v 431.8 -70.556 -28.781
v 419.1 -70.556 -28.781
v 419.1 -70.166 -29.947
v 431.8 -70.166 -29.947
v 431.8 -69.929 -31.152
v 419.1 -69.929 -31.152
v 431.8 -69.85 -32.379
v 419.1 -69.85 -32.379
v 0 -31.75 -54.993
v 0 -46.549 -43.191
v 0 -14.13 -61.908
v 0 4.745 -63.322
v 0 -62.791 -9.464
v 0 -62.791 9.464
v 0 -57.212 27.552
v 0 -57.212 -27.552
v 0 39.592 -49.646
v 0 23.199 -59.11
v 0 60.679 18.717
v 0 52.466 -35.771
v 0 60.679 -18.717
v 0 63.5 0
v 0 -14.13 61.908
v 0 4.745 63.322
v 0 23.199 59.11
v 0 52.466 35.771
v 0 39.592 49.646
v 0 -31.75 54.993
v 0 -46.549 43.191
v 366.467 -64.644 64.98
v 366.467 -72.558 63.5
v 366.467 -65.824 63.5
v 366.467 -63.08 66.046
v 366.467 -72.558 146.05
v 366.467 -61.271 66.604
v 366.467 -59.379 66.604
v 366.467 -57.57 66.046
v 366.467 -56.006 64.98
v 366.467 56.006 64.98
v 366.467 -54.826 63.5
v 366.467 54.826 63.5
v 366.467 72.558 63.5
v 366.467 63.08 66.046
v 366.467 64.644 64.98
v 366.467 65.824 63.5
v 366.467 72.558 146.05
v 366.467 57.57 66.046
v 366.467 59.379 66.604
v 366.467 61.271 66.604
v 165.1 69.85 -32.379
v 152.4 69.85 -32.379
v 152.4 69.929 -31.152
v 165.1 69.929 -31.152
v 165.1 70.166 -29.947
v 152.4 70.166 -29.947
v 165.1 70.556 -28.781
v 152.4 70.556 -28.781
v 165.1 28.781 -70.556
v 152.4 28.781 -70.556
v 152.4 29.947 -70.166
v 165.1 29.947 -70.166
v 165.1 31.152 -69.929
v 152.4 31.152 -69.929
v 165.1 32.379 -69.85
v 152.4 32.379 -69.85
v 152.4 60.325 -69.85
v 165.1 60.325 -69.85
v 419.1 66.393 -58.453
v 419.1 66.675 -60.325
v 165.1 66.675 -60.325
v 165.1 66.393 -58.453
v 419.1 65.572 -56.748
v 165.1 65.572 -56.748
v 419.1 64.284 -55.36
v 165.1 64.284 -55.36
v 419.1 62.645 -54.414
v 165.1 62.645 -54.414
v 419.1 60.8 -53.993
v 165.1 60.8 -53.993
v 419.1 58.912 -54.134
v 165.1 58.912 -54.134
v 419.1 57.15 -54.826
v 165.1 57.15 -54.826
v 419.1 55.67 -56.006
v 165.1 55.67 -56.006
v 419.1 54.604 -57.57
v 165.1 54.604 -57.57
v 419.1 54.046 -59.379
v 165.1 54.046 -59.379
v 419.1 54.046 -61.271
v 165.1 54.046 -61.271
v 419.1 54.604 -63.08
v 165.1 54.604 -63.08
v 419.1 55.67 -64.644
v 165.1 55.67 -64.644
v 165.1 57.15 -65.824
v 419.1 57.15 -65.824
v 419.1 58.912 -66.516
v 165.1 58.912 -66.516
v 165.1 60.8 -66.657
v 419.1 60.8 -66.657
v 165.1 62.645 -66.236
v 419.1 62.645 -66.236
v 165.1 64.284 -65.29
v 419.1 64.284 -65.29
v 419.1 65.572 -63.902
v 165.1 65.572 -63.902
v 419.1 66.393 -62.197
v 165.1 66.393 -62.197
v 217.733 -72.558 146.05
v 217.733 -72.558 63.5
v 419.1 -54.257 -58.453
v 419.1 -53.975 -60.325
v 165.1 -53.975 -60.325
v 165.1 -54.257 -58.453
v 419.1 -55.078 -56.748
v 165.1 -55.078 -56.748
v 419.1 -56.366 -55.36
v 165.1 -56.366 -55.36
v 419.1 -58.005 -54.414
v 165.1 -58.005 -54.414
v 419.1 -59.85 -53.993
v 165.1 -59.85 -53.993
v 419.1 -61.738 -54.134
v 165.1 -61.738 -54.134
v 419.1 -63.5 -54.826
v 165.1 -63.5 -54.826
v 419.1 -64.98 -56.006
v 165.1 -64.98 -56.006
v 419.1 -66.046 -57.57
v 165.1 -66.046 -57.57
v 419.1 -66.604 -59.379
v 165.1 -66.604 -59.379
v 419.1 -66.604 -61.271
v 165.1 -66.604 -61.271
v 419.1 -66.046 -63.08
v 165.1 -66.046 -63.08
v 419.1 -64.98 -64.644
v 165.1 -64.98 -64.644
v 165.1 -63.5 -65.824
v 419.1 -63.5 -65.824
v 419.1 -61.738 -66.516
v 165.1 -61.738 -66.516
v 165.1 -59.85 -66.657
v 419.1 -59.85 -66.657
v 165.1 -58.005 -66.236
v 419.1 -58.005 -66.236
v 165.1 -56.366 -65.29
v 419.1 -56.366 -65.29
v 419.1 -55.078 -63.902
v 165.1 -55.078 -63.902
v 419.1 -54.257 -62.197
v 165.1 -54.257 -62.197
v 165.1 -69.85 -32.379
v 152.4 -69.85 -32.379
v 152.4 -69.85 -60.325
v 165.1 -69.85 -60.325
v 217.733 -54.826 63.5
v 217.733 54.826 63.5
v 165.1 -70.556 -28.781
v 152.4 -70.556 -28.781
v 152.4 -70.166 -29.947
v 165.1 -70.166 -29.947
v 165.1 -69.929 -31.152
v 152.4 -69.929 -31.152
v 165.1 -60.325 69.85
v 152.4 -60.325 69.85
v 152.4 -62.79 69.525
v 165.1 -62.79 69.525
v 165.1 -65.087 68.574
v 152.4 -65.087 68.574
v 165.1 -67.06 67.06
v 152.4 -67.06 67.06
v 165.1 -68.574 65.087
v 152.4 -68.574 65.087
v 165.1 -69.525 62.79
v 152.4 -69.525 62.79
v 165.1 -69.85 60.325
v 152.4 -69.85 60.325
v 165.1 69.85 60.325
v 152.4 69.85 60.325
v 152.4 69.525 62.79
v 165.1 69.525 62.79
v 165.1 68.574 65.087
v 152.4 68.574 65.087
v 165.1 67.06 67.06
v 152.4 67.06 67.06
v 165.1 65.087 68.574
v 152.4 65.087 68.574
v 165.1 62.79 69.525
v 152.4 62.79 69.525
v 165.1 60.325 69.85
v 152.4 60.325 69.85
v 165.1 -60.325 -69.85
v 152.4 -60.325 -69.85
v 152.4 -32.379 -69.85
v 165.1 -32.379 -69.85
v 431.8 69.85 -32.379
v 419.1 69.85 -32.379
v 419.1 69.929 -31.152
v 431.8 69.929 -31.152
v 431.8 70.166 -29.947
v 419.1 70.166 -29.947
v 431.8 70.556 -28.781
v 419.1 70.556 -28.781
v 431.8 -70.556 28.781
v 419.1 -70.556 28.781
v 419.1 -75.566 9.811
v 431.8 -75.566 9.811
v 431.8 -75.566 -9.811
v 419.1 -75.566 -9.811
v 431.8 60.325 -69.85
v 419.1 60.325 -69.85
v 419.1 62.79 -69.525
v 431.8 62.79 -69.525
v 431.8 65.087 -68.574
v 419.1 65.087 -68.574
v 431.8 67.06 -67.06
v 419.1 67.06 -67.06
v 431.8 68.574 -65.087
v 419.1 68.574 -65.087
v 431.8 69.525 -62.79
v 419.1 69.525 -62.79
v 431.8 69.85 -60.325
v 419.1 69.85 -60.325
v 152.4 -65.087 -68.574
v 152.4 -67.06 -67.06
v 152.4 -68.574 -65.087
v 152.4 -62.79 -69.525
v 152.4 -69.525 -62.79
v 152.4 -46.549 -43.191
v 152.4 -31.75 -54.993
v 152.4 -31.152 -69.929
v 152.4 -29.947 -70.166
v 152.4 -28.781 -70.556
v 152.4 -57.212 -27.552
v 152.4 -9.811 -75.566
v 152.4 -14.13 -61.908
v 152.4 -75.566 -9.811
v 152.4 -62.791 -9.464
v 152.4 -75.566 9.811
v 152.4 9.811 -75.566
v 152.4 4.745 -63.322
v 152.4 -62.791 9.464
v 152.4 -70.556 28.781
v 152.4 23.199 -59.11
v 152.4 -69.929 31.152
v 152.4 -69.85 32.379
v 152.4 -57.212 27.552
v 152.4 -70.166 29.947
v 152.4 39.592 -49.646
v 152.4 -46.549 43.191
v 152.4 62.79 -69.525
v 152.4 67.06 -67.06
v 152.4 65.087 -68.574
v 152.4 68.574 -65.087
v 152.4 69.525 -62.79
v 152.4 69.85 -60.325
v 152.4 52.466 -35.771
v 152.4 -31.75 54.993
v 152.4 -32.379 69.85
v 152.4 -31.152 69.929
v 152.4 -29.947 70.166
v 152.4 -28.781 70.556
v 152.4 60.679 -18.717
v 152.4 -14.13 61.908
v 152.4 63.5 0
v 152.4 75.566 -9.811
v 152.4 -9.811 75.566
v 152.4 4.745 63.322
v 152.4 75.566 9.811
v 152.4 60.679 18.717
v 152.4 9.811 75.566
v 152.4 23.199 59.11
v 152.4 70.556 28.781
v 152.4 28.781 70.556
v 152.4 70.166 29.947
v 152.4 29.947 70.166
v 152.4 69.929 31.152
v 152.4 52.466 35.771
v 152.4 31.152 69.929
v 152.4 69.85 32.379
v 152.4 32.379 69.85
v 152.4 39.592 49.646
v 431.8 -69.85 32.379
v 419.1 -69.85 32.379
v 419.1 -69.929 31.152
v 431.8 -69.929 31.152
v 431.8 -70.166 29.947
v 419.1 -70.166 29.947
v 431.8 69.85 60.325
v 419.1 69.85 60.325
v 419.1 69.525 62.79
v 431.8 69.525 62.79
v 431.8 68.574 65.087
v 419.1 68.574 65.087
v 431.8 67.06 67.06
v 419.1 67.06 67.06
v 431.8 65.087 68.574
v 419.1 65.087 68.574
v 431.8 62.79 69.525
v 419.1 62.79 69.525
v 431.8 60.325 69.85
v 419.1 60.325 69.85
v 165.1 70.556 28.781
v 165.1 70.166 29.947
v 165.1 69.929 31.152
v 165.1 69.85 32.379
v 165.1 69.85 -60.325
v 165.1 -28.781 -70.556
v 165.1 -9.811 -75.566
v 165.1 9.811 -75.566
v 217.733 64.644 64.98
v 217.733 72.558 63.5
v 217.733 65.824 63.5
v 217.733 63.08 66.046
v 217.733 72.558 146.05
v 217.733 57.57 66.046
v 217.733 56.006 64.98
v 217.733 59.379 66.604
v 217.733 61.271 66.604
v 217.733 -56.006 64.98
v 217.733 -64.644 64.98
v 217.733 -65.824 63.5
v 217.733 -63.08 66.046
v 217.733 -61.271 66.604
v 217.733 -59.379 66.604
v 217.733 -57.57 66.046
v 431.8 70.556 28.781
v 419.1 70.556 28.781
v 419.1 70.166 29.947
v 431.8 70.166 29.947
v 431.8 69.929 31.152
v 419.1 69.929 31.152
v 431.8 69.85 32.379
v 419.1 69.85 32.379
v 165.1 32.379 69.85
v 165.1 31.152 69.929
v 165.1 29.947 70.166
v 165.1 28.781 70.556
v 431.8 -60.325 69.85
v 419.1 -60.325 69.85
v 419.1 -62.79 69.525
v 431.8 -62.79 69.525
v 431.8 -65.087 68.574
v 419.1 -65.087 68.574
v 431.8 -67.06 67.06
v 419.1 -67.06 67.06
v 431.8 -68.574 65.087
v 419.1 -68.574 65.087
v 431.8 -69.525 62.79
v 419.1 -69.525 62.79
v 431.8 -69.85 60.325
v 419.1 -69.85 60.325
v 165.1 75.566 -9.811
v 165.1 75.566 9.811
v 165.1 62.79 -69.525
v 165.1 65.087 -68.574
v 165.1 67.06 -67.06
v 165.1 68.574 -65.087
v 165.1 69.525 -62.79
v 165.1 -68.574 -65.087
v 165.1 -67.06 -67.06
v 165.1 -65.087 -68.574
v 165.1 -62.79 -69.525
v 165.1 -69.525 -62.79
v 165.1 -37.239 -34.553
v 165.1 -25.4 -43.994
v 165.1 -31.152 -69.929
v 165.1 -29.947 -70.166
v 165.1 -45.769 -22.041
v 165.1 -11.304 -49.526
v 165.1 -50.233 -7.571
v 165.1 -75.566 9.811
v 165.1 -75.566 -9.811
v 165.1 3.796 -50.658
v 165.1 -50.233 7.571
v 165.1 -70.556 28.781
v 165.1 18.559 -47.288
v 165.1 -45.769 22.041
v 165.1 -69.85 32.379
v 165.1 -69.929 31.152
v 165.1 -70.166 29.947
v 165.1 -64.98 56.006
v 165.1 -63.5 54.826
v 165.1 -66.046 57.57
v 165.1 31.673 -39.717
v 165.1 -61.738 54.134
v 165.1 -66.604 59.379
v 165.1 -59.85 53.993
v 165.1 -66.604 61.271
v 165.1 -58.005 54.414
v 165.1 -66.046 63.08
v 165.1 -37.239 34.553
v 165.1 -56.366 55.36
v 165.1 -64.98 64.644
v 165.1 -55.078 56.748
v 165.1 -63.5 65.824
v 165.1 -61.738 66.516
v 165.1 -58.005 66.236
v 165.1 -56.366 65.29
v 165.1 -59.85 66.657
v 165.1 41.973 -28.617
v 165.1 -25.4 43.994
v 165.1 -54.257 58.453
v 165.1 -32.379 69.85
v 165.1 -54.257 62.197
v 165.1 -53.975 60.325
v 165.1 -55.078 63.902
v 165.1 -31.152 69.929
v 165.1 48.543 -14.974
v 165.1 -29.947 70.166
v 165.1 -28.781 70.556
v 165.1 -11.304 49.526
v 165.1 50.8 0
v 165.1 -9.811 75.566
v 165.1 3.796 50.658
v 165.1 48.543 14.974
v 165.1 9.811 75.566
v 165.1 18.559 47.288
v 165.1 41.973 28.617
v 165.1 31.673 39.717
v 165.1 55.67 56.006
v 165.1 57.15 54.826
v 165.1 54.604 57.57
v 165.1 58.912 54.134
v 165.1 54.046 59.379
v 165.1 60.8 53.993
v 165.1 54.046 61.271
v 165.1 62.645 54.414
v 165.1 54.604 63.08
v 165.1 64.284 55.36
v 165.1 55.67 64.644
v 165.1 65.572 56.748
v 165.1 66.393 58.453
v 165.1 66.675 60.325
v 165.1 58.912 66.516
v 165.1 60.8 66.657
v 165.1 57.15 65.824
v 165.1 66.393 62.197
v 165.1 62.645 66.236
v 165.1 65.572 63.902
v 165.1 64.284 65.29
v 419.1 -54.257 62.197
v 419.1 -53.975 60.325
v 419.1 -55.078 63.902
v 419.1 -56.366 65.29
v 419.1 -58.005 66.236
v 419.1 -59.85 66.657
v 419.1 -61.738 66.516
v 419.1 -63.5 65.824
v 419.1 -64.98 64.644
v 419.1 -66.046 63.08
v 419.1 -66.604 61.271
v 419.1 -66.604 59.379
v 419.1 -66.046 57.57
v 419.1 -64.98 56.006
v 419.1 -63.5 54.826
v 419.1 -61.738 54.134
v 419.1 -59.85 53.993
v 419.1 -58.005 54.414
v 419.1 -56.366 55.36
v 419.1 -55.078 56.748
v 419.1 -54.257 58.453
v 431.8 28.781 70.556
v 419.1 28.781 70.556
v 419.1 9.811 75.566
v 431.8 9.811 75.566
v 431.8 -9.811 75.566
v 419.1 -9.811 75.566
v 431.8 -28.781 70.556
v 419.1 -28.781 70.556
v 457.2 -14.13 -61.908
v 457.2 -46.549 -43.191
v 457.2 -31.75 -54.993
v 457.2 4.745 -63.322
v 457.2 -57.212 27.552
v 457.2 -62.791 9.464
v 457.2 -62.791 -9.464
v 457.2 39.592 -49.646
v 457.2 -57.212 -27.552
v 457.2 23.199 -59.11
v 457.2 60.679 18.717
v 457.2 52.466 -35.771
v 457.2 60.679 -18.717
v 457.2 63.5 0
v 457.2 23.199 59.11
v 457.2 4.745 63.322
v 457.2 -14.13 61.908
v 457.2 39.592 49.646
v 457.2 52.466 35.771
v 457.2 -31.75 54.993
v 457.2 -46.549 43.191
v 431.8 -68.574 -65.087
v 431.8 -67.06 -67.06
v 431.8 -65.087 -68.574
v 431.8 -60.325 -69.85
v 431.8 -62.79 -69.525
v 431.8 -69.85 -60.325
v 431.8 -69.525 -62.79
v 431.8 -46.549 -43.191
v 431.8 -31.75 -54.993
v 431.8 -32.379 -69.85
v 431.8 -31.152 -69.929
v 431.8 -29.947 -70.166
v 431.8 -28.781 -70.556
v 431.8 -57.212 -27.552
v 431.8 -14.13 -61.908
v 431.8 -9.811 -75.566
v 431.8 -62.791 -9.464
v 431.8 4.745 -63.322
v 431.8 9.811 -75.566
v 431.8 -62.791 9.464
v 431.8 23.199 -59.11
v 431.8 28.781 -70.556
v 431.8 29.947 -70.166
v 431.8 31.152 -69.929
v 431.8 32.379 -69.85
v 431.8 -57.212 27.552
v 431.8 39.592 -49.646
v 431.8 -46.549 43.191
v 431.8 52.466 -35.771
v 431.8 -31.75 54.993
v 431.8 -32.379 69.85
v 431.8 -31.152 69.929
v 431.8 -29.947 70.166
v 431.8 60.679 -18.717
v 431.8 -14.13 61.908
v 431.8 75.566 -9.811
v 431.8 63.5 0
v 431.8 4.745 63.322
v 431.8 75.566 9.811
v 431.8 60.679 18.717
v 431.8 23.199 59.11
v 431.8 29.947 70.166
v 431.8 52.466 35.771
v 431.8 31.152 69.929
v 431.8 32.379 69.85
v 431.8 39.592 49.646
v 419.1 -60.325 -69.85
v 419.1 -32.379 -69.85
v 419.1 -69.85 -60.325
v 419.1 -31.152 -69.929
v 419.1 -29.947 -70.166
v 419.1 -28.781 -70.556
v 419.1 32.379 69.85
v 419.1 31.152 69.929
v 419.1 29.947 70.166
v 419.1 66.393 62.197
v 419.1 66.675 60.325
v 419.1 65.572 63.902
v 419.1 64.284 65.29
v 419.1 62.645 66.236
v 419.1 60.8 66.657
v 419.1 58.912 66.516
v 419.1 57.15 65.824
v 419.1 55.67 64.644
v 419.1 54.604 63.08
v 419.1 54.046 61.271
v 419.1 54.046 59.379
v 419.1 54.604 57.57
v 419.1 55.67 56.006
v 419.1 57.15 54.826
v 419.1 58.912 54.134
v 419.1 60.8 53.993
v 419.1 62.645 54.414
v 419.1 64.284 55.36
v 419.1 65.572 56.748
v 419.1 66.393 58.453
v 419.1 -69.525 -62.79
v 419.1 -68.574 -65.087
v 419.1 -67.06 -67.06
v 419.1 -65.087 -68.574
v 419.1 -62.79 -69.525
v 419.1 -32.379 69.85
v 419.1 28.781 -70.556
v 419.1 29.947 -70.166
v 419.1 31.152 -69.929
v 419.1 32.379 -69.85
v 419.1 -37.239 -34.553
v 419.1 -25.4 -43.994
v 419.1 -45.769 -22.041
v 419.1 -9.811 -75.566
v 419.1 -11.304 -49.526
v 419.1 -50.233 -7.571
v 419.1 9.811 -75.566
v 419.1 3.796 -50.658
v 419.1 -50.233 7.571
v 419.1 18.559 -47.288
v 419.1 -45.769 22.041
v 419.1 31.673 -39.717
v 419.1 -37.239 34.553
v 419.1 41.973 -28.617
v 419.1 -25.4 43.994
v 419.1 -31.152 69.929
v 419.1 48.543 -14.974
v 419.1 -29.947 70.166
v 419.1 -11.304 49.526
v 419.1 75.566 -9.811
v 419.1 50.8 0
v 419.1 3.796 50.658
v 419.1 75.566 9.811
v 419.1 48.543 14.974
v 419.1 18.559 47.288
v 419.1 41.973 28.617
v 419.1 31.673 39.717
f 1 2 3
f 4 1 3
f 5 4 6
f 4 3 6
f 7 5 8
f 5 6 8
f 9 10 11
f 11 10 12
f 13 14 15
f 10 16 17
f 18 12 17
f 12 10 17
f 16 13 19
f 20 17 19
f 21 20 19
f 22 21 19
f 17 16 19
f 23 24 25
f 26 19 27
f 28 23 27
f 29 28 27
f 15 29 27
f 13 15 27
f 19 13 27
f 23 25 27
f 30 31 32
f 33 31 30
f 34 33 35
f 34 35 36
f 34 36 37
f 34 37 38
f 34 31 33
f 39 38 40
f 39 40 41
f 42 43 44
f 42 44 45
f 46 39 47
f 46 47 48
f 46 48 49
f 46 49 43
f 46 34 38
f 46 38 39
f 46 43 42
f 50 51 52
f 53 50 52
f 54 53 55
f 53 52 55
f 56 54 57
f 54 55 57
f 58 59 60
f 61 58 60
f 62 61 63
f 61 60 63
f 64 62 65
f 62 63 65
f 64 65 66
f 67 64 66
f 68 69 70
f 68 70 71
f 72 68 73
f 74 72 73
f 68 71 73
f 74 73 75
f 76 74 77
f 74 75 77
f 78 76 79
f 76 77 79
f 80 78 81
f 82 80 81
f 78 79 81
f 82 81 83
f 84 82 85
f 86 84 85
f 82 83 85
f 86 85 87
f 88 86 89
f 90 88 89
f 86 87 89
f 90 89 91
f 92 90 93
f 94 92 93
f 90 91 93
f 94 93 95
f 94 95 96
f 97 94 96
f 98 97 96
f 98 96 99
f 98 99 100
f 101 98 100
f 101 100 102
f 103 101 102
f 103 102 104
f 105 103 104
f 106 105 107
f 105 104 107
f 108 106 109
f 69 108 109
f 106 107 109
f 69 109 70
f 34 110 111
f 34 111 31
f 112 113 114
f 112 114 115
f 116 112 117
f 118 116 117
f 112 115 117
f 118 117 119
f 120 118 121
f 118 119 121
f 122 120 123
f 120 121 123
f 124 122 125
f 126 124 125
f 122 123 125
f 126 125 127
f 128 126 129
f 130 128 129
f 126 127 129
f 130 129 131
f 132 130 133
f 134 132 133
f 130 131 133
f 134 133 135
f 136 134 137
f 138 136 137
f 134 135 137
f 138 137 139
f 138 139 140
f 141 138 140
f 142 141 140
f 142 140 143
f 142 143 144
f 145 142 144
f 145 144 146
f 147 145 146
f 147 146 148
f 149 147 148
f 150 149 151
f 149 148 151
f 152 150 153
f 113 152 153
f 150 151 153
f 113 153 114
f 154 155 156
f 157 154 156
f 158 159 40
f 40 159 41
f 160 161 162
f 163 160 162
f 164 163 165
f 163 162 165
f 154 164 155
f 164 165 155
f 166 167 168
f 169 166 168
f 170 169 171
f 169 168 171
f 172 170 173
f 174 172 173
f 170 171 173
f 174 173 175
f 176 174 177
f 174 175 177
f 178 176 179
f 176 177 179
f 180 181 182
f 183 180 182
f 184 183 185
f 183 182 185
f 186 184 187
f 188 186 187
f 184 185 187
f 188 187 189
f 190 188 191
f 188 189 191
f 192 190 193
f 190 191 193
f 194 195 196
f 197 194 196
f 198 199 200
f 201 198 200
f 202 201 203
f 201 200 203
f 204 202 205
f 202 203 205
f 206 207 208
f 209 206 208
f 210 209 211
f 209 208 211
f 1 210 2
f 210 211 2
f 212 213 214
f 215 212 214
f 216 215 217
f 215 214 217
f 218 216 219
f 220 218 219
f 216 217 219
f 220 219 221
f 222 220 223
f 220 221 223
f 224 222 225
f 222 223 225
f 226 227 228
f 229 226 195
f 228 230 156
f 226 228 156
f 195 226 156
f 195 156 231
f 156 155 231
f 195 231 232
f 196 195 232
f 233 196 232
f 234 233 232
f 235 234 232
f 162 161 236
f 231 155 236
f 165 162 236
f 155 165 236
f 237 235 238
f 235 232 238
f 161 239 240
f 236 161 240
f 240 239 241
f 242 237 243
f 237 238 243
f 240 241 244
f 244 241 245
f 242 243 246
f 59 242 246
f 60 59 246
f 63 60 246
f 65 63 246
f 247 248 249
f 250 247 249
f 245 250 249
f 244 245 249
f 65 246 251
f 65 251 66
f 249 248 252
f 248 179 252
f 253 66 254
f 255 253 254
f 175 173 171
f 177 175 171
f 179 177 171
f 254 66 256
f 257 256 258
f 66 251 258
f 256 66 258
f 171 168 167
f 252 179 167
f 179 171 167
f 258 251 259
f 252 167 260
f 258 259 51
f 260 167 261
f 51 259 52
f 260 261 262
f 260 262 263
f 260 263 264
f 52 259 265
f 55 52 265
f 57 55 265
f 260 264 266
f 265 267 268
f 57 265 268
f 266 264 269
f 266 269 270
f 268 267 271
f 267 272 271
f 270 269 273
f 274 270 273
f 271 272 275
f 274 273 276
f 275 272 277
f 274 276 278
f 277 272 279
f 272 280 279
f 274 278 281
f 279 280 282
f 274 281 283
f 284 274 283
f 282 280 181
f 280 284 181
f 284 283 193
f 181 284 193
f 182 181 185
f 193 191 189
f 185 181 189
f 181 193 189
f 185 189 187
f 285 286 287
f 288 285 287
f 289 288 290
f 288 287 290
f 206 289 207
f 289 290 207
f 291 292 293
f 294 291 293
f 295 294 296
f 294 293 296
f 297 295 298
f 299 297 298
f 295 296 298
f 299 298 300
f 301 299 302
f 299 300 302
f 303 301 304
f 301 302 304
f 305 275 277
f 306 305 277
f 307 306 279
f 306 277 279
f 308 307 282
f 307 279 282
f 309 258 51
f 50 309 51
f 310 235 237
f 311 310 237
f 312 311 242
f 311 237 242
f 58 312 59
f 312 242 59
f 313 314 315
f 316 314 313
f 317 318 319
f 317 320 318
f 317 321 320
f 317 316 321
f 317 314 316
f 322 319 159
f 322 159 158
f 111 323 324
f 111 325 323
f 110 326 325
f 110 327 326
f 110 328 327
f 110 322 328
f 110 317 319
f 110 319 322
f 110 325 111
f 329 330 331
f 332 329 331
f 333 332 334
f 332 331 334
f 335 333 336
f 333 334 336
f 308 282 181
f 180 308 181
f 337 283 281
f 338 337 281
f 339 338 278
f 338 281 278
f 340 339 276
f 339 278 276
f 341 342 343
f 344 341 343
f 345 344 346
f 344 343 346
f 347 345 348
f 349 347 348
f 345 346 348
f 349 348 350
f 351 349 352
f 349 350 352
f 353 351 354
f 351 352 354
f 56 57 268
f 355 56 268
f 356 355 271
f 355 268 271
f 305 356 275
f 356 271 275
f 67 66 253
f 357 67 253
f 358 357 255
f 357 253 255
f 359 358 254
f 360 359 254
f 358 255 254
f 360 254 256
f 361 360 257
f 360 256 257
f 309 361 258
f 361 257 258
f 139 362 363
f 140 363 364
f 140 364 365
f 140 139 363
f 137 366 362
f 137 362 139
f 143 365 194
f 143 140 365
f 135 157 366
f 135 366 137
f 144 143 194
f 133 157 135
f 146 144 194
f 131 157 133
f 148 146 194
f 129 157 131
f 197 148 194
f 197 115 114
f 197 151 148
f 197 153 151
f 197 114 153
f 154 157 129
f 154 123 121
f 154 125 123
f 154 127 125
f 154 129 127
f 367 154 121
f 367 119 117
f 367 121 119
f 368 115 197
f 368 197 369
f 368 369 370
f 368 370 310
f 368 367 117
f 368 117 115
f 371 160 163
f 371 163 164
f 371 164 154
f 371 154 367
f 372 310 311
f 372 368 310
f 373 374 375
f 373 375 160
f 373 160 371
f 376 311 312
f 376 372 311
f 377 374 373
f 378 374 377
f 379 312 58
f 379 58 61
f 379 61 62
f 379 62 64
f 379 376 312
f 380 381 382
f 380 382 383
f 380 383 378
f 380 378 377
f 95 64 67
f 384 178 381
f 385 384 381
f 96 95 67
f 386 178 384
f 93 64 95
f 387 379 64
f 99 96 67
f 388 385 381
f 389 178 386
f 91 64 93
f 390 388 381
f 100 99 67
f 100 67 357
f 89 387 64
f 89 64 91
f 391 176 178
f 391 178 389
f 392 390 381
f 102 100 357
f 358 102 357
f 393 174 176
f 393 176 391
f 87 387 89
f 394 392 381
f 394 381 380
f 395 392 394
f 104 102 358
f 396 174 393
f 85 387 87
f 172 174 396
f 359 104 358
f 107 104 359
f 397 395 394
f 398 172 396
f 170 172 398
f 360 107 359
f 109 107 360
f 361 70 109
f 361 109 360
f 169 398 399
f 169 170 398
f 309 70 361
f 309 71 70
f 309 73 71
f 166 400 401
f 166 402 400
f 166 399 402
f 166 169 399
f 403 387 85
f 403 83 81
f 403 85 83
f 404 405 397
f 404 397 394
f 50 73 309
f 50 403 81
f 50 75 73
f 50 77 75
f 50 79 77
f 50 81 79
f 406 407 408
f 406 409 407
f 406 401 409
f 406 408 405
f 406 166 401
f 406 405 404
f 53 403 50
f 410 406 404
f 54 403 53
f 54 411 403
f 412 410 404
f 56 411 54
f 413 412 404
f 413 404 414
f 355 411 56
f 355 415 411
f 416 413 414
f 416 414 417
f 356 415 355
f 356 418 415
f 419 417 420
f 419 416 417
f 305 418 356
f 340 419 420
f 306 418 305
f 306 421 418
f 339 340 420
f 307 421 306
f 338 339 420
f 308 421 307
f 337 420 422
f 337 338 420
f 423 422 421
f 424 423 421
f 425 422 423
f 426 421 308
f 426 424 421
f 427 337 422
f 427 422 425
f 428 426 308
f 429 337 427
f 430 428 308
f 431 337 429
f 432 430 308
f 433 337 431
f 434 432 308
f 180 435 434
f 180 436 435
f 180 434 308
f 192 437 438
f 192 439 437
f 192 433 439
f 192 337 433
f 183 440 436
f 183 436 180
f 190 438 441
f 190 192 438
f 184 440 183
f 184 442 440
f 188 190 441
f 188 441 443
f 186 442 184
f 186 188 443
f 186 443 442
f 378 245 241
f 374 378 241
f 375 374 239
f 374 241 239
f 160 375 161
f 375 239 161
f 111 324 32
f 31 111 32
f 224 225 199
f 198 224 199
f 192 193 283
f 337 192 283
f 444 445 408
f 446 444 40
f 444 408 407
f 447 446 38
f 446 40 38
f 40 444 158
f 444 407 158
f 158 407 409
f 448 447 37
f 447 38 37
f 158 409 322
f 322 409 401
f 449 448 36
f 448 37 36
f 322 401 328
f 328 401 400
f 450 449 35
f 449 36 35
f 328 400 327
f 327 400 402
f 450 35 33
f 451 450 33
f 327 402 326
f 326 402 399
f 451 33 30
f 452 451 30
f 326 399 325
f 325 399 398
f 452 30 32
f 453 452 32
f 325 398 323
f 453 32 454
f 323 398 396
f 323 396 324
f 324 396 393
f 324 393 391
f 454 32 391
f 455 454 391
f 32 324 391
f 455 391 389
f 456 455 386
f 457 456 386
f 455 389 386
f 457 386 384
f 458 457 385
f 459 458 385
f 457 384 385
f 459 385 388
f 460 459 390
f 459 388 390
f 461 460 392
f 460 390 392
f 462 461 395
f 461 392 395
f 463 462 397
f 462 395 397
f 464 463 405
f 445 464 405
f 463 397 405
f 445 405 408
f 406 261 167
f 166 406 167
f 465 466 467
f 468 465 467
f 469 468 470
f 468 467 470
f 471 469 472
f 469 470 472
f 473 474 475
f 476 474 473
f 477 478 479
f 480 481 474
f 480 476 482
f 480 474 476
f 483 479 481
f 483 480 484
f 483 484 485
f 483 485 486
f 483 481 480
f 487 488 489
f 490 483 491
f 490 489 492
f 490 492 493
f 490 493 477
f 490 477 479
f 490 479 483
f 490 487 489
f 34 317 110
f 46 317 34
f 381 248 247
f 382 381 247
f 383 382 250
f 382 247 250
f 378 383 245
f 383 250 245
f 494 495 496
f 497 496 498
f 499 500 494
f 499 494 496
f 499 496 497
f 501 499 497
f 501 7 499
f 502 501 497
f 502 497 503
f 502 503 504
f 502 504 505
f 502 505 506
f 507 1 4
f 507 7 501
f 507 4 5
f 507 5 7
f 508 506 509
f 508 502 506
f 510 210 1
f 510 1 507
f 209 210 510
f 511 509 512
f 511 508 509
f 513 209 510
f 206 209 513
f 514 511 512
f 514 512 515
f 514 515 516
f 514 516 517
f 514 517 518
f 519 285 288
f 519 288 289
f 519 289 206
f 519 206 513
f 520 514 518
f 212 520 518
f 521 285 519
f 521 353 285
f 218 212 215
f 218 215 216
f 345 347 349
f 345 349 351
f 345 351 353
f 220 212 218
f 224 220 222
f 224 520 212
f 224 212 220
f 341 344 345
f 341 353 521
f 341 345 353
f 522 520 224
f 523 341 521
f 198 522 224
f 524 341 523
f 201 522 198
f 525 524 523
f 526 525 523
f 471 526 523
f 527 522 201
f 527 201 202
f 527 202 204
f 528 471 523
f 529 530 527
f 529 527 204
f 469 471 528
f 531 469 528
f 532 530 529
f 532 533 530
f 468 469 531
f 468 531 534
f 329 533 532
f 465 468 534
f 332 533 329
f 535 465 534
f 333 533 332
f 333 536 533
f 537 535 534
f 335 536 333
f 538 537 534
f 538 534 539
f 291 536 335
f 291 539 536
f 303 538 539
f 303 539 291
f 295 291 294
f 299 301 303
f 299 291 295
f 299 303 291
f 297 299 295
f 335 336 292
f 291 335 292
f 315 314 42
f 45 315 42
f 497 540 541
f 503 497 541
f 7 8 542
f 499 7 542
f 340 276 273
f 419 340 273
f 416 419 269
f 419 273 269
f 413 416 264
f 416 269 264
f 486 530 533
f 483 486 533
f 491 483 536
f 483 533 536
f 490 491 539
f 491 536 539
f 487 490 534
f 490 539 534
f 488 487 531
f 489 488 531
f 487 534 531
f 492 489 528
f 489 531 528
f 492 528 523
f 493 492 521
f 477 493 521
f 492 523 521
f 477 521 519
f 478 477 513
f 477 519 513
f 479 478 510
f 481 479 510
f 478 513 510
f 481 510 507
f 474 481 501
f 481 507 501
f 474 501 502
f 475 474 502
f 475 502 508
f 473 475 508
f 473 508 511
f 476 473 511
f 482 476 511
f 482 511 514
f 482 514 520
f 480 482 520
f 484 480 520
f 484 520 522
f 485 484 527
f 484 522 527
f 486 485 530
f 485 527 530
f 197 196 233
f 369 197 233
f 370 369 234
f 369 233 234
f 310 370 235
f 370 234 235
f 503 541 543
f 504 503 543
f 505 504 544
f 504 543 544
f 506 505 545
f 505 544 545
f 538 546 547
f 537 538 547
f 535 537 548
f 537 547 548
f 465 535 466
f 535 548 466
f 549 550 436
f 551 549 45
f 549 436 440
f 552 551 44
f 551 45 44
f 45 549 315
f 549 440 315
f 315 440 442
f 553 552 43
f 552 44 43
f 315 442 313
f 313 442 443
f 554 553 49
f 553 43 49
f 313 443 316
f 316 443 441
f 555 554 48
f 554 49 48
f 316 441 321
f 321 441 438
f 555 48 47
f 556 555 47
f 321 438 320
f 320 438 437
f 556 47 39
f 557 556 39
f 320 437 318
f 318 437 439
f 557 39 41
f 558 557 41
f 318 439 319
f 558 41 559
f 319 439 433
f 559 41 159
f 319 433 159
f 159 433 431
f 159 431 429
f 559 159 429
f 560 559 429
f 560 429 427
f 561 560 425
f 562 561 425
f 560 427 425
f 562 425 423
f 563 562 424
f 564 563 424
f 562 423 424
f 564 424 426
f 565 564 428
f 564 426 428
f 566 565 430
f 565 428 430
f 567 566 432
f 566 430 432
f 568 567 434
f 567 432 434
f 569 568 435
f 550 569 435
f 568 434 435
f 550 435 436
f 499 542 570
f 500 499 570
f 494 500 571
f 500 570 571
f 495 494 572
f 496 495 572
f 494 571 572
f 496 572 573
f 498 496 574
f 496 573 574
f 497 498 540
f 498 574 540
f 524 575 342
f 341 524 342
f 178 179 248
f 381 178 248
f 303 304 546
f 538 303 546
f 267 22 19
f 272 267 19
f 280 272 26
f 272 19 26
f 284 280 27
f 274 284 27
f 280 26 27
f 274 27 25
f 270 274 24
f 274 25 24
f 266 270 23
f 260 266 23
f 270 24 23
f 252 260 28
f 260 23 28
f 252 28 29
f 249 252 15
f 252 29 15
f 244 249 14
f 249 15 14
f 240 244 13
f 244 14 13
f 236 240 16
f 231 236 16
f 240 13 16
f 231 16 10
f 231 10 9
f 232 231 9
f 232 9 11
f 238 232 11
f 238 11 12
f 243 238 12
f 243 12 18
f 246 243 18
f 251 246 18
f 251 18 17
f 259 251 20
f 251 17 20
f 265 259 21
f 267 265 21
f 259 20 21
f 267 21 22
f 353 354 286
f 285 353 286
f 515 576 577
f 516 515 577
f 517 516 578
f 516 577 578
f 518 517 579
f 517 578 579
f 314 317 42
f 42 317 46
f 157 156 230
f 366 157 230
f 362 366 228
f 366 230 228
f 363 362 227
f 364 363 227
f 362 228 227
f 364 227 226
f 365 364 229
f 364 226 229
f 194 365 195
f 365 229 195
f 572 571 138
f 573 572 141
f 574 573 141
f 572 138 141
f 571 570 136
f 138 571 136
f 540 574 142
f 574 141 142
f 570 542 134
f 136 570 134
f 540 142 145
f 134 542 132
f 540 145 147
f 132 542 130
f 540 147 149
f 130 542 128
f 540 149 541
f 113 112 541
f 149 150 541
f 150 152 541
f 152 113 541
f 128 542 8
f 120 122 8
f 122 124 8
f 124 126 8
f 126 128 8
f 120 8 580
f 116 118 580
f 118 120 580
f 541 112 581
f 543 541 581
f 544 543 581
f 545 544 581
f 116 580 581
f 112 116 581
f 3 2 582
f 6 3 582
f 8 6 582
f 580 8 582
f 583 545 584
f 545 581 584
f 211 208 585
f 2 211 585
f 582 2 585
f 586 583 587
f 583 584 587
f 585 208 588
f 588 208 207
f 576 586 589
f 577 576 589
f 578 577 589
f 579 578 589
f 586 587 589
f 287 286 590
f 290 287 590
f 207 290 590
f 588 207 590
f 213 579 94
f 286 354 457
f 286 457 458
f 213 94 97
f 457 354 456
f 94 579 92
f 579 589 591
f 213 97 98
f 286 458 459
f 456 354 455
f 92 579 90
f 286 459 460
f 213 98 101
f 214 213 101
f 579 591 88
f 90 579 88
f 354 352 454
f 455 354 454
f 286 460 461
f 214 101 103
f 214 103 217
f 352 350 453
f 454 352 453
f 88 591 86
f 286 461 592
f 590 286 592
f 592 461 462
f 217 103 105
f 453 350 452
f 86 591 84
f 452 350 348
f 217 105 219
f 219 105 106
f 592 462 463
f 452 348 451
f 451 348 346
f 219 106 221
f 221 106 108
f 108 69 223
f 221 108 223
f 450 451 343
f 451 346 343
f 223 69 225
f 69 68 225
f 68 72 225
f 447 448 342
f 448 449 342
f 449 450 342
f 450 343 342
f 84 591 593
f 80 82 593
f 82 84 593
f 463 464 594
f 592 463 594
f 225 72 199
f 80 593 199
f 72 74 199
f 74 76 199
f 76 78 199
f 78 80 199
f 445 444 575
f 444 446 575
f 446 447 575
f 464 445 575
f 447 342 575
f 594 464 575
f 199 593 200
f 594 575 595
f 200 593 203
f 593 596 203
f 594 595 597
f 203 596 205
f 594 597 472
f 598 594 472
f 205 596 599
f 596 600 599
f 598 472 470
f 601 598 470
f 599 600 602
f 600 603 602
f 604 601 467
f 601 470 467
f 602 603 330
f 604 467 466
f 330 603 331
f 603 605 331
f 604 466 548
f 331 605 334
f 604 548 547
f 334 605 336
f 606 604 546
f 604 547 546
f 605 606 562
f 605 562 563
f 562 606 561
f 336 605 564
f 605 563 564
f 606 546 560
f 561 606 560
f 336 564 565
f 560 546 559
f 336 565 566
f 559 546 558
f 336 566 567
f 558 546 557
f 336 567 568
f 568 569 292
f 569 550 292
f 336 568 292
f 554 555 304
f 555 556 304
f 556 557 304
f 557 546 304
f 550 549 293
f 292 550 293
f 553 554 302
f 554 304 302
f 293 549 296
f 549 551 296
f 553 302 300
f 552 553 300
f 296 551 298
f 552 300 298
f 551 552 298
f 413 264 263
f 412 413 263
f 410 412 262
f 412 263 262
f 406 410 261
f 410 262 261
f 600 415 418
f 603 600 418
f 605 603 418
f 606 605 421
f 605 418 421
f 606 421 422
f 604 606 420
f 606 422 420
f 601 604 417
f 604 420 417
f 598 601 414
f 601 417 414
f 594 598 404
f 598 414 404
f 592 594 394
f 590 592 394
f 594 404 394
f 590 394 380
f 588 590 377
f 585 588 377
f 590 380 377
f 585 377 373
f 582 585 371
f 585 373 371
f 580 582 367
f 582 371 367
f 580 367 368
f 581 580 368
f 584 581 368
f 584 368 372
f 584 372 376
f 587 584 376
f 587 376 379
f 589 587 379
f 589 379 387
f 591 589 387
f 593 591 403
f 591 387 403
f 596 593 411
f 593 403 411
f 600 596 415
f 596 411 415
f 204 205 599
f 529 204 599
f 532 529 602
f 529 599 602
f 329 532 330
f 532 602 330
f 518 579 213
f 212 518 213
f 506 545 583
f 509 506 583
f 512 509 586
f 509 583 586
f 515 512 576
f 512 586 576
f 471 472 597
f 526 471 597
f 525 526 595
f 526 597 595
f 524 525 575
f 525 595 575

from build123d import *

# Parameters (mm, degrees)
F0_R          = 63.5
F1_DEPTH      = 152.4
F2_R          = 63.5
F3_DEPTH      = 12.7
F4_R          = 50.8
F4_R_2        = 6.35
F5_DEPTH      = 254
F6_R          = 50.8
F7_DEPTH      = 12.7
F8_W          = 148.7337000847
F8_H          = 72.5575238466
F9_DEPTH      = 76.2
F9_DEPTH_BACK = 6.35
F10_R         = 63.5
F11_DEPTH     = 25.4


with BuildPart() as f1:
    # F0 (on Right) → F1 (new body)
    with BuildSketch(Plane.YZ):
        Circle(F0_R)
    extrude(amount=F1_DEPTH)

    # F2 (on face) → F3 (join)
    with BuildSketch(Plane.YZ.offset(152.4)):
        with BuildLine():
            ThreePointArc((-69.85, 32.3787739113), (-70.0280530831, 30.5456868066), (-70.5555555556, 28.7811323656))
            ThreePointArc((-70.5555555556, 28.7811323656), (-76.2, 0), (-70.5555555556, -28.7811323656))
            ThreePointArc((-70.5555555556, -28.7811323656), (-70.0280530831, -30.5456868066), (-69.85, -32.3787739113))
            Line((-69.85, -32.3787739113), (-69.85, -60.325))
            ThreePointArc((-69.85, -60.325), (-67.0601920908, -67.0601920908), (-60.325, -69.85))
            Line((-60.325, -69.85), (-32.3787739113, -69.85))
            ThreePointArc((-32.3787739113, -69.85), (-30.5456868066, -70.0280530831), (-28.7811323656, -70.5555555556))
            ThreePointArc((-28.7811323656, -70.5555555556), (0, -76.2), (28.7811323656, -70.5555555556))
            ThreePointArc((28.7811323656, -70.5555555556), (30.5456868066, -70.0280530831), (32.3787739113, -69.85))
            Line((32.3787739113, -69.85), (60.325, -69.85))
            ThreePointArc((60.325, -69.85), (67.0601920908, -67.0601920908), (69.85, -60.325))
            Line((69.85, -60.325), (69.85, -32.3787739113))
            ThreePointArc((69.85, -32.3787739113), (70.0280530831, -30.5456868066), (70.5555555556, -28.7811323656))
            ThreePointArc((70.5555555556, -28.7811323656), (76.2, 0), (70.5555555556, 28.7811323656))
            ThreePointArc((70.5555555556, 28.7811323656), (70.0280530831, 30.5456868066), (69.85, 32.3787739113))
            Line((69.85, 32.3787739113), (69.85, 60.325))
            ThreePointArc((69.85, 60.325), (67.0601920908, 67.0601920908), (60.325, 69.85))
            Line((60.325, 69.85), (32.3787739113, 69.85))
            ThreePointArc((32.3787739113, 69.85), (30.5456868066, 70.0280530831), (28.7811323656, 70.5555555556))
            ThreePointArc((28.7811323656, 70.5555555556), (0, 76.2), (-28.7811323656, 70.5555555556))
            ThreePointArc((-28.7811323656, 70.5555555556), (-30.5456868066, 70.0280530831), (-32.3787739113, 69.85))
            Line((-32.3787739113, 69.85), (-60.325, 69.85))
            ThreePointArc((-60.325, 69.85), (-67.0601920908, 67.0601920908), (-69.85, 60.325))
            Line((-69.85, 60.325), (-69.85, 32.3787739113))
        make_face()
        Circle(F2_R, mode=Mode.SUBTRACT)
        Circle(F2_R)
    extrude(amount=F3_DEPTH)

    # F4 (on face) → F5 (join)
    with BuildSketch(Plane.YZ.offset(165.1)):
        Circle(F4_R)
        with Locations((60.325, 60.325)):
            Circle(F4_R_2)
        with Locations((60.325, -60.325)):
            Circle(F4_R_2)
        with Locations((-60.325, -60.325)):
            Circle(F4_R_2)
        with Locations((-60.325, 60.325)):
            Circle(F4_R_2)
    extrude(amount=F5_DEPTH)

    # F6 (on face) → F7 (join)
    with BuildSketch(Plane.YZ.offset(419.1)):
        with BuildLine():
            ThreePointArc((-69.85, 32.3787739113), (-70.0280530831, 30.5456868066), (-70.5555555556, 28.7811323656))
            ThreePointArc((-70.5555555556, 28.7811323656), (-76.2, 0), (-70.5555555556, -28.7811323656))
            ThreePointArc((-70.5555555556, -28.7811323656), (-70.0280530831, -30.5456868066), (-69.85, -32.3787739113))
            Line((-69.85, -32.3787739113), (-69.85, -60.325))
            ThreePointArc((-69.85, -60.325), (-67.0601920908, -67.0601920908), (-60.325, -69.85))
            Line((-60.325, -69.85), (-32.3787739113, -69.85))
            ThreePointArc((-32.3787739113, -69.85), (-30.5456868066, -70.0280530831), (-28.7811323656, -70.5555555556))
            ThreePointArc((-28.7811323656, -70.5555555556), (0, -76.2), (28.7811323656, -70.5555555556))
            ThreePointArc((28.7811323656, -70.5555555556), (30.5456868066, -70.0280530831), (32.3787739113, -69.85))
            Line((32.3787739113, -69.85), (60.325, -69.85))
            ThreePointArc((60.325, -69.85), (67.0601920908, -67.0601920908), (69.85, -60.325))
            Line((69.85, -60.325), (69.85, -32.3787739113))
            ThreePointArc((69.85, -32.3787739113), (70.0280530831, -30.5456868066), (70.5555555556, -28.7811323656))
            ThreePointArc((70.5555555556, -28.7811323656), (76.2, 0), (70.5555555556, 28.7811323656))
            ThreePointArc((70.5555555556, 28.7811323656), (70.0280530831, 30.5456868066), (69.85, 32.3787739113))
            Line((69.85, 32.3787739113), (69.85, 60.325))
            ThreePointArc((69.85, 60.325), (67.0601920908, 67.0601920908), (60.325, 69.85))
            Line((60.325, 69.85), (32.3787739113, 69.85))
            ThreePointArc((32.3787739113, 69.85), (30.5456868066, 70.0280530831), (28.7811323656, 70.5555555556))
            ThreePointArc((28.7811323656, 70.5555555556), (0, 76.2), (-28.7811323656, 70.5555555556))
            ThreePointArc((-28.7811323656, 70.5555555556), (-30.5456868066, 70.0280530831), (-32.3787739113, 69.85))
            Line((-32.3787739113, 69.85), (-60.325, 69.85))
            ThreePointArc((-60.325, 69.85), (-67.0601920908, 67.0601920908), (-69.85, 60.325))
            Line((-69.85, 60.325), (-69.85, 32.3787739113))
        make_face()
        Circle(F6_R, mode=Mode.SUBTRACT)
        Circle(F6_R)
    extrude(amount=F7_DEPTH)

    # F8 (on face) → F9 (join, two sides)
    with BuildSketch(Plane.XY.offset(69.85)) as f9_sk:
        with Locations((292.1, 36.2787619233)):
            Rectangle(F8_W, F8_H)
        with Locations((292.1, -36.2787619233)):
            Rectangle(F8_W, F8_H)
    extrude(amount=F9_DEPTH)
    extrude(f9_sk.sketch, amount=-F9_DEPTH_BACK)

    # F10 (on face) → F11 (join)
    with BuildSketch(Plane.YZ.offset(431.8)):
        Circle(F10_R)
    extrude(amount=F11_DEPTH)


solid = f1.part
